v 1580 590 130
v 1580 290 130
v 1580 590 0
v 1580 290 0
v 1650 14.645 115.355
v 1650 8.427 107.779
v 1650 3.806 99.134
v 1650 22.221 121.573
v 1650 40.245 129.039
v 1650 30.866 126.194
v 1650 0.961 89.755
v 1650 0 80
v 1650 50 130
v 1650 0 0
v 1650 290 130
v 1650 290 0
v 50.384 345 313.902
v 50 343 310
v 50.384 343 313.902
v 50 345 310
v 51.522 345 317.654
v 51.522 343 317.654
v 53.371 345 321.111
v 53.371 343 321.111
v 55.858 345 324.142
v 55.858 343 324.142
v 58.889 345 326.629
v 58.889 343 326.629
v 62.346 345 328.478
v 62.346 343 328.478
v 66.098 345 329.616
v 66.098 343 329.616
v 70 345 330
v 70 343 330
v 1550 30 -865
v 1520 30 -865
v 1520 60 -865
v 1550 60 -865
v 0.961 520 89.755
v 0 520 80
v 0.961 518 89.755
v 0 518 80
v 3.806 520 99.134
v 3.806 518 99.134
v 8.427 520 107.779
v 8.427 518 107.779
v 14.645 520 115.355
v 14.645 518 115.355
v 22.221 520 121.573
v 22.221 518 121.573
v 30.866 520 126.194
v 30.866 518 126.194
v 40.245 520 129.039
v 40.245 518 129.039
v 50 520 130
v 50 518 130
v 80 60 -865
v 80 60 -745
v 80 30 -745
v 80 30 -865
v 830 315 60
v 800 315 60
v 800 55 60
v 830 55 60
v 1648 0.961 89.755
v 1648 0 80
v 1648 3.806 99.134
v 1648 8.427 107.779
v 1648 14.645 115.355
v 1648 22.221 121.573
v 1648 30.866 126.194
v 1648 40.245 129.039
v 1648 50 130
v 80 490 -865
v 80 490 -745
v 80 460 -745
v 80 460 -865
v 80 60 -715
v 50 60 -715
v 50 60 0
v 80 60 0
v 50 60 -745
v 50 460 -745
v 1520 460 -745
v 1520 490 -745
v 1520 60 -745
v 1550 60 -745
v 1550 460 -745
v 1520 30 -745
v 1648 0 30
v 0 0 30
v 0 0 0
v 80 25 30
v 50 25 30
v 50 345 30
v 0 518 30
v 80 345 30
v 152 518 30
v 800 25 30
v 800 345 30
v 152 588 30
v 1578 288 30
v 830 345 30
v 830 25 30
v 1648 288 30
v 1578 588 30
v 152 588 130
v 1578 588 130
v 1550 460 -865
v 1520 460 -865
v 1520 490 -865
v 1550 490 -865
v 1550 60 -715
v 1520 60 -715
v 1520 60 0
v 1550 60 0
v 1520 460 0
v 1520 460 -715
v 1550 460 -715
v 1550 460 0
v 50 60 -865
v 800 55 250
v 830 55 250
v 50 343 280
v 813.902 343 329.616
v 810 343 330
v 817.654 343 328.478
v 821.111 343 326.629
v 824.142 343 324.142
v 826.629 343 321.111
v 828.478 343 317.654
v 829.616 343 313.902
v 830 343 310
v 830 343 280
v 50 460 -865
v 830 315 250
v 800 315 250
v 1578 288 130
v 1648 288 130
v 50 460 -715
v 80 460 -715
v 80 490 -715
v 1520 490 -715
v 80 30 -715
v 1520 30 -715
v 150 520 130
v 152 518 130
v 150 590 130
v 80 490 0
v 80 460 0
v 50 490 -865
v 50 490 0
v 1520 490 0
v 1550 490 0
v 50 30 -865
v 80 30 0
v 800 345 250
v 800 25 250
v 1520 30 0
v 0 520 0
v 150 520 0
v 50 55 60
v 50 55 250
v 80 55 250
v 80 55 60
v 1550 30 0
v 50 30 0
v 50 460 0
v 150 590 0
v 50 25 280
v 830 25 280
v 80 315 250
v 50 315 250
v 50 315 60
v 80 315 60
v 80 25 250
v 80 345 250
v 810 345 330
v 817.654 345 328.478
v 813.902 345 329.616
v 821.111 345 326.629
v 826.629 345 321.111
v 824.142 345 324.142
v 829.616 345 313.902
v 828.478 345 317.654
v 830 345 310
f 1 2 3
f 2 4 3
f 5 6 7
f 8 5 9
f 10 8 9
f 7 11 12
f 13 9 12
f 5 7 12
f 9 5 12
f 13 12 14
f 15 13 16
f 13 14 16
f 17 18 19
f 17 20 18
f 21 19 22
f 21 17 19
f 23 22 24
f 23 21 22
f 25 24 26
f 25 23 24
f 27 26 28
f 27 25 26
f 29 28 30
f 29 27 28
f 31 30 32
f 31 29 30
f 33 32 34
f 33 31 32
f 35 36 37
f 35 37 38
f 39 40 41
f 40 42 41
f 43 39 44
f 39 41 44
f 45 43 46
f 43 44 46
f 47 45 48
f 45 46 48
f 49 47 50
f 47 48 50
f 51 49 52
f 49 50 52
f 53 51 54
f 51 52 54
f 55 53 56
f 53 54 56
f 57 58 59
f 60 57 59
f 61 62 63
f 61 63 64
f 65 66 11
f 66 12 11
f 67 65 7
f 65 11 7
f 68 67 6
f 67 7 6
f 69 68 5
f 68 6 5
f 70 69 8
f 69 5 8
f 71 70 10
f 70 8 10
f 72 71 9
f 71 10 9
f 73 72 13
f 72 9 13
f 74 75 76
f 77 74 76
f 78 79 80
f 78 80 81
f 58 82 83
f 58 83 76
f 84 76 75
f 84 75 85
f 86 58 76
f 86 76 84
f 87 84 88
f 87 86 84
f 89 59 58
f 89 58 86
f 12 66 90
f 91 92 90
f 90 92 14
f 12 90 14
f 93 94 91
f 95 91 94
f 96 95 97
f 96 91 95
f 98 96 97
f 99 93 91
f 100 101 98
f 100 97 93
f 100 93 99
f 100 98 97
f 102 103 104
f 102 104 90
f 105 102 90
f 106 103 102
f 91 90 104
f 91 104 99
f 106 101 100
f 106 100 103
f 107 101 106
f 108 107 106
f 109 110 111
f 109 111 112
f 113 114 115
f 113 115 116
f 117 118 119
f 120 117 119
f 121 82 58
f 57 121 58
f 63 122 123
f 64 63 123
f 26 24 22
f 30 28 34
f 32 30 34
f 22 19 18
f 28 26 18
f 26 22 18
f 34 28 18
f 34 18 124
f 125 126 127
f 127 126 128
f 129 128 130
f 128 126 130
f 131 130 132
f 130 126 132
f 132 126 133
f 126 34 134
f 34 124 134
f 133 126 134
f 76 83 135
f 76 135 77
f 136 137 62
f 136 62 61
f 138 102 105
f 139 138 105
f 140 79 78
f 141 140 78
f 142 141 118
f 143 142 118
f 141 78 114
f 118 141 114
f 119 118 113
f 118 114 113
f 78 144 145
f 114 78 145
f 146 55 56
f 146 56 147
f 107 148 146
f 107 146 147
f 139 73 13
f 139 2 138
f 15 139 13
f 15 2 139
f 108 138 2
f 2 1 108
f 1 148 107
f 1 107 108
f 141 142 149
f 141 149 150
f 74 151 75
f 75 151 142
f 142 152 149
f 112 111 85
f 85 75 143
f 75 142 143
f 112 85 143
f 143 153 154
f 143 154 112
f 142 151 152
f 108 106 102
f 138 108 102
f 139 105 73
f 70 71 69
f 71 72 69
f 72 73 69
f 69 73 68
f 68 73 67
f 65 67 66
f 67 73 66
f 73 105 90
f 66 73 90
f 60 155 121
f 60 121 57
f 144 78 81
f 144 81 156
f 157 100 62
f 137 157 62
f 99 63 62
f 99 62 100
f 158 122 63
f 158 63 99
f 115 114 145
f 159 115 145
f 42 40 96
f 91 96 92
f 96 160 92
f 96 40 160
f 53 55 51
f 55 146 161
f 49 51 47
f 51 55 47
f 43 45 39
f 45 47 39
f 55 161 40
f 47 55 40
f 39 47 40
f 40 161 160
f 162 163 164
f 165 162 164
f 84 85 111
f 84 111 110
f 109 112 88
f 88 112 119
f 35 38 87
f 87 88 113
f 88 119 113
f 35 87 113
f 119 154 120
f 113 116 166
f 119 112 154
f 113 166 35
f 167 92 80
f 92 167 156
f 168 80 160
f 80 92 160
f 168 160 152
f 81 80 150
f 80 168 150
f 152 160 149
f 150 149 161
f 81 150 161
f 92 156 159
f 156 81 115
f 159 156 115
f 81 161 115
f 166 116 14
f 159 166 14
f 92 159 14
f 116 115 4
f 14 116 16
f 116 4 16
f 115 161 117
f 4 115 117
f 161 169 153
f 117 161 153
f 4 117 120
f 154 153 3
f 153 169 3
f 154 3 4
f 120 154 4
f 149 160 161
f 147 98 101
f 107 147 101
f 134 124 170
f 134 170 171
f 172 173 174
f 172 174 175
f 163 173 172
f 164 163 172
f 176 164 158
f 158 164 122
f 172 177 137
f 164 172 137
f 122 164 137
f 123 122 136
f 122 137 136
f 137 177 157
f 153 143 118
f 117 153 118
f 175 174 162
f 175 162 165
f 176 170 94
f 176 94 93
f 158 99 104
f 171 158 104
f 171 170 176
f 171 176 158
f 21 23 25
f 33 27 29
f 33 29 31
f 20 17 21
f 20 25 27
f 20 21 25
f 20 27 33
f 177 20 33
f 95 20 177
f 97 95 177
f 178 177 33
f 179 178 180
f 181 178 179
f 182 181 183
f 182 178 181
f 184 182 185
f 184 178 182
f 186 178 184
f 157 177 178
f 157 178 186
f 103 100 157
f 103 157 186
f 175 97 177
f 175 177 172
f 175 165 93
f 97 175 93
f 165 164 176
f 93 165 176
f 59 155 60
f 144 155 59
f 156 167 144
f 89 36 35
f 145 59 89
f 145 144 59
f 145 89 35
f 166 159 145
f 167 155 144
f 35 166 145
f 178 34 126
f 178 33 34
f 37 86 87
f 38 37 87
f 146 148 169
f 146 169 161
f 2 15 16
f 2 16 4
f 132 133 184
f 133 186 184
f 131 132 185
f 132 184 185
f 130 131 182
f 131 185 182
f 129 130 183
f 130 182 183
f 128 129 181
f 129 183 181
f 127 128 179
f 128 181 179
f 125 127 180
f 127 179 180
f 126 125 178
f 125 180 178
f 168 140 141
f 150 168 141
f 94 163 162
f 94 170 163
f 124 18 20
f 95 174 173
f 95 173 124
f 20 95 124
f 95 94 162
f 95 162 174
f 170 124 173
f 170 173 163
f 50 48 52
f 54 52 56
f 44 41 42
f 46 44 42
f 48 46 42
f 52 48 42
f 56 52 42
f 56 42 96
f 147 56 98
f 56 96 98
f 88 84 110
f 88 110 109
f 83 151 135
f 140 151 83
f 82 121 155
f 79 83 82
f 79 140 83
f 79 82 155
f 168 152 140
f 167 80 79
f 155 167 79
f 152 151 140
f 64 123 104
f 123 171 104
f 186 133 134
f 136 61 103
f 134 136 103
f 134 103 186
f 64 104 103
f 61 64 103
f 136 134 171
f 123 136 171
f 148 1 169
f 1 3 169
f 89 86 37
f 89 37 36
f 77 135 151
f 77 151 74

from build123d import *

# Parameters (mm, degrees)
F1_DEPTH  = 30
F3_DEPTH  = 100
F4_R      = 50
F5_W      = 30
F5_H      = 30
F6_DEPTH  = 865
F8_W      = 1500
F8_H      = 460
F9_DEPTH  = 30
F11_W     = 780
F11_H     = 320
F12_DEPTH = 30
F13_W     = 30
F13_H     = 30
F14_DEPTH = 220
F15_W     = 30
F15_H     = 30
F16_DEPTH = 260
F17_W     = 780
F17_H     = 2
F18_DEPTH = 50
F19_R     = 20


with BuildPart() as f1:
    # F0 (on Top) → F1 (new body)
    with BuildSketch(Plane.XY):
        Polygon((0, 520), (0, 0), (1650, 0), (1650, 290), (1580, 290), (1580, 590), (150, 590), (150, 520), align=None)
    extrude(amount=F1_DEPTH)

    # F2 (on face) → F3 (join)
    with BuildSketch(Plane.XY.offset(30)):
        Polygon((1648, 0), (1650, 0), (1650, 290), (1580, 290), (1580, 590), (150, 590), (150, 520), (0, 520), (0, 518), (152, 518), (152, 588), (1578, 588), (1578, 288), (1648, 288), align=None)
    extrude(amount=F3_DEPTH)

    # F4
    f4_edges = [f1.edges().sort_by_distance(p)[0] for p in [
        (0, 519, 130),
        (1649, 0, 130),
    ]]
    fillet(f4_edges, radius=F4_R)

    # F5 (on face) → F6 (join)
    with BuildSketch(Plane(origin=(0, 0, 0), x_dir=(1, 0, 0), z_dir=(0, 0, -1))):
        with Locations((65, -45)):
            Rectangle(F5_W, F5_H)
        with Locations((1535, -45)):
            Rectangle(F5_W, F5_H)
        with Locations((1535, -475)):
            Rectangle(F5_W, F5_H)
        with Locations((65, -475)):
            Rectangle(F5_W, F5_H)
    extrude(amount=F6_DEPTH)

    # F8 (on offset) → F9 (join)
    with BuildSketch(Plane(origin=(0, 0, -715), x_dir=(1, 0, 0), z_dir=(0, 0, -1))):
        with Locations((800, -260)):
            Rectangle(F8_W, F8_H)
    extrude(amount=F9_DEPTH)



with BuildPart() as f12:
    # F11 (on offset) → F12 (new body)
    with BuildSketch(Plane.XY.offset(280)):
        with Locations((440, 185)):
            Rectangle(F11_W, F11_H)
    extrude(amount=-F12_DEPTH)


with BuildPart() as f1_1:
    add(f1.part)

    add(f12.part)  # F14 merges F12
    # F13 (on face) → F14 (join, through all)
    with BuildSketch(Plane(origin=(0, 0, 250), x_dir=(1, 0, 0), z_dir=(0, 0, -1))):
        with Locations((65, -40)):
            Rectangle(F13_W, F13_H)
        with Locations((65, -330)):
            Rectangle(F13_W, F13_H)
        with Locations((815, -40)):
            Rectangle(F13_W, F13_H)
        with Locations((815, -330)):
            Rectangle(F13_W, F13_H)
    extrude(amount=F14_DEPTH)

    # F15 (on face) → F16 (join, through all)
    with BuildSketch(Plane.XZ.offset(-315)):
        with Locations((65, 45)):
            Rectangle(F15_W, F15_H)
        with Locations((815, 45)):
            Rectangle(F15_W, F15_H)
    extrude(amount=F16_DEPTH)

    # F17 (on face) → F18 (join)
    with BuildSketch(Plane.XY.offset(280)):
        with Locations((440, 344)):
            Rectangle(F17_W, F17_H)
    extrude(amount=F18_DEPTH)

    # F19
    f19_edges = [f1_1.edges().sort_by_distance(p)[0] for p in [
        (50, 344, 330),
        (830, 344, 330),
    ]]
    fillet(f19_edges, radius=F19_R)


solid = f1_1.part
